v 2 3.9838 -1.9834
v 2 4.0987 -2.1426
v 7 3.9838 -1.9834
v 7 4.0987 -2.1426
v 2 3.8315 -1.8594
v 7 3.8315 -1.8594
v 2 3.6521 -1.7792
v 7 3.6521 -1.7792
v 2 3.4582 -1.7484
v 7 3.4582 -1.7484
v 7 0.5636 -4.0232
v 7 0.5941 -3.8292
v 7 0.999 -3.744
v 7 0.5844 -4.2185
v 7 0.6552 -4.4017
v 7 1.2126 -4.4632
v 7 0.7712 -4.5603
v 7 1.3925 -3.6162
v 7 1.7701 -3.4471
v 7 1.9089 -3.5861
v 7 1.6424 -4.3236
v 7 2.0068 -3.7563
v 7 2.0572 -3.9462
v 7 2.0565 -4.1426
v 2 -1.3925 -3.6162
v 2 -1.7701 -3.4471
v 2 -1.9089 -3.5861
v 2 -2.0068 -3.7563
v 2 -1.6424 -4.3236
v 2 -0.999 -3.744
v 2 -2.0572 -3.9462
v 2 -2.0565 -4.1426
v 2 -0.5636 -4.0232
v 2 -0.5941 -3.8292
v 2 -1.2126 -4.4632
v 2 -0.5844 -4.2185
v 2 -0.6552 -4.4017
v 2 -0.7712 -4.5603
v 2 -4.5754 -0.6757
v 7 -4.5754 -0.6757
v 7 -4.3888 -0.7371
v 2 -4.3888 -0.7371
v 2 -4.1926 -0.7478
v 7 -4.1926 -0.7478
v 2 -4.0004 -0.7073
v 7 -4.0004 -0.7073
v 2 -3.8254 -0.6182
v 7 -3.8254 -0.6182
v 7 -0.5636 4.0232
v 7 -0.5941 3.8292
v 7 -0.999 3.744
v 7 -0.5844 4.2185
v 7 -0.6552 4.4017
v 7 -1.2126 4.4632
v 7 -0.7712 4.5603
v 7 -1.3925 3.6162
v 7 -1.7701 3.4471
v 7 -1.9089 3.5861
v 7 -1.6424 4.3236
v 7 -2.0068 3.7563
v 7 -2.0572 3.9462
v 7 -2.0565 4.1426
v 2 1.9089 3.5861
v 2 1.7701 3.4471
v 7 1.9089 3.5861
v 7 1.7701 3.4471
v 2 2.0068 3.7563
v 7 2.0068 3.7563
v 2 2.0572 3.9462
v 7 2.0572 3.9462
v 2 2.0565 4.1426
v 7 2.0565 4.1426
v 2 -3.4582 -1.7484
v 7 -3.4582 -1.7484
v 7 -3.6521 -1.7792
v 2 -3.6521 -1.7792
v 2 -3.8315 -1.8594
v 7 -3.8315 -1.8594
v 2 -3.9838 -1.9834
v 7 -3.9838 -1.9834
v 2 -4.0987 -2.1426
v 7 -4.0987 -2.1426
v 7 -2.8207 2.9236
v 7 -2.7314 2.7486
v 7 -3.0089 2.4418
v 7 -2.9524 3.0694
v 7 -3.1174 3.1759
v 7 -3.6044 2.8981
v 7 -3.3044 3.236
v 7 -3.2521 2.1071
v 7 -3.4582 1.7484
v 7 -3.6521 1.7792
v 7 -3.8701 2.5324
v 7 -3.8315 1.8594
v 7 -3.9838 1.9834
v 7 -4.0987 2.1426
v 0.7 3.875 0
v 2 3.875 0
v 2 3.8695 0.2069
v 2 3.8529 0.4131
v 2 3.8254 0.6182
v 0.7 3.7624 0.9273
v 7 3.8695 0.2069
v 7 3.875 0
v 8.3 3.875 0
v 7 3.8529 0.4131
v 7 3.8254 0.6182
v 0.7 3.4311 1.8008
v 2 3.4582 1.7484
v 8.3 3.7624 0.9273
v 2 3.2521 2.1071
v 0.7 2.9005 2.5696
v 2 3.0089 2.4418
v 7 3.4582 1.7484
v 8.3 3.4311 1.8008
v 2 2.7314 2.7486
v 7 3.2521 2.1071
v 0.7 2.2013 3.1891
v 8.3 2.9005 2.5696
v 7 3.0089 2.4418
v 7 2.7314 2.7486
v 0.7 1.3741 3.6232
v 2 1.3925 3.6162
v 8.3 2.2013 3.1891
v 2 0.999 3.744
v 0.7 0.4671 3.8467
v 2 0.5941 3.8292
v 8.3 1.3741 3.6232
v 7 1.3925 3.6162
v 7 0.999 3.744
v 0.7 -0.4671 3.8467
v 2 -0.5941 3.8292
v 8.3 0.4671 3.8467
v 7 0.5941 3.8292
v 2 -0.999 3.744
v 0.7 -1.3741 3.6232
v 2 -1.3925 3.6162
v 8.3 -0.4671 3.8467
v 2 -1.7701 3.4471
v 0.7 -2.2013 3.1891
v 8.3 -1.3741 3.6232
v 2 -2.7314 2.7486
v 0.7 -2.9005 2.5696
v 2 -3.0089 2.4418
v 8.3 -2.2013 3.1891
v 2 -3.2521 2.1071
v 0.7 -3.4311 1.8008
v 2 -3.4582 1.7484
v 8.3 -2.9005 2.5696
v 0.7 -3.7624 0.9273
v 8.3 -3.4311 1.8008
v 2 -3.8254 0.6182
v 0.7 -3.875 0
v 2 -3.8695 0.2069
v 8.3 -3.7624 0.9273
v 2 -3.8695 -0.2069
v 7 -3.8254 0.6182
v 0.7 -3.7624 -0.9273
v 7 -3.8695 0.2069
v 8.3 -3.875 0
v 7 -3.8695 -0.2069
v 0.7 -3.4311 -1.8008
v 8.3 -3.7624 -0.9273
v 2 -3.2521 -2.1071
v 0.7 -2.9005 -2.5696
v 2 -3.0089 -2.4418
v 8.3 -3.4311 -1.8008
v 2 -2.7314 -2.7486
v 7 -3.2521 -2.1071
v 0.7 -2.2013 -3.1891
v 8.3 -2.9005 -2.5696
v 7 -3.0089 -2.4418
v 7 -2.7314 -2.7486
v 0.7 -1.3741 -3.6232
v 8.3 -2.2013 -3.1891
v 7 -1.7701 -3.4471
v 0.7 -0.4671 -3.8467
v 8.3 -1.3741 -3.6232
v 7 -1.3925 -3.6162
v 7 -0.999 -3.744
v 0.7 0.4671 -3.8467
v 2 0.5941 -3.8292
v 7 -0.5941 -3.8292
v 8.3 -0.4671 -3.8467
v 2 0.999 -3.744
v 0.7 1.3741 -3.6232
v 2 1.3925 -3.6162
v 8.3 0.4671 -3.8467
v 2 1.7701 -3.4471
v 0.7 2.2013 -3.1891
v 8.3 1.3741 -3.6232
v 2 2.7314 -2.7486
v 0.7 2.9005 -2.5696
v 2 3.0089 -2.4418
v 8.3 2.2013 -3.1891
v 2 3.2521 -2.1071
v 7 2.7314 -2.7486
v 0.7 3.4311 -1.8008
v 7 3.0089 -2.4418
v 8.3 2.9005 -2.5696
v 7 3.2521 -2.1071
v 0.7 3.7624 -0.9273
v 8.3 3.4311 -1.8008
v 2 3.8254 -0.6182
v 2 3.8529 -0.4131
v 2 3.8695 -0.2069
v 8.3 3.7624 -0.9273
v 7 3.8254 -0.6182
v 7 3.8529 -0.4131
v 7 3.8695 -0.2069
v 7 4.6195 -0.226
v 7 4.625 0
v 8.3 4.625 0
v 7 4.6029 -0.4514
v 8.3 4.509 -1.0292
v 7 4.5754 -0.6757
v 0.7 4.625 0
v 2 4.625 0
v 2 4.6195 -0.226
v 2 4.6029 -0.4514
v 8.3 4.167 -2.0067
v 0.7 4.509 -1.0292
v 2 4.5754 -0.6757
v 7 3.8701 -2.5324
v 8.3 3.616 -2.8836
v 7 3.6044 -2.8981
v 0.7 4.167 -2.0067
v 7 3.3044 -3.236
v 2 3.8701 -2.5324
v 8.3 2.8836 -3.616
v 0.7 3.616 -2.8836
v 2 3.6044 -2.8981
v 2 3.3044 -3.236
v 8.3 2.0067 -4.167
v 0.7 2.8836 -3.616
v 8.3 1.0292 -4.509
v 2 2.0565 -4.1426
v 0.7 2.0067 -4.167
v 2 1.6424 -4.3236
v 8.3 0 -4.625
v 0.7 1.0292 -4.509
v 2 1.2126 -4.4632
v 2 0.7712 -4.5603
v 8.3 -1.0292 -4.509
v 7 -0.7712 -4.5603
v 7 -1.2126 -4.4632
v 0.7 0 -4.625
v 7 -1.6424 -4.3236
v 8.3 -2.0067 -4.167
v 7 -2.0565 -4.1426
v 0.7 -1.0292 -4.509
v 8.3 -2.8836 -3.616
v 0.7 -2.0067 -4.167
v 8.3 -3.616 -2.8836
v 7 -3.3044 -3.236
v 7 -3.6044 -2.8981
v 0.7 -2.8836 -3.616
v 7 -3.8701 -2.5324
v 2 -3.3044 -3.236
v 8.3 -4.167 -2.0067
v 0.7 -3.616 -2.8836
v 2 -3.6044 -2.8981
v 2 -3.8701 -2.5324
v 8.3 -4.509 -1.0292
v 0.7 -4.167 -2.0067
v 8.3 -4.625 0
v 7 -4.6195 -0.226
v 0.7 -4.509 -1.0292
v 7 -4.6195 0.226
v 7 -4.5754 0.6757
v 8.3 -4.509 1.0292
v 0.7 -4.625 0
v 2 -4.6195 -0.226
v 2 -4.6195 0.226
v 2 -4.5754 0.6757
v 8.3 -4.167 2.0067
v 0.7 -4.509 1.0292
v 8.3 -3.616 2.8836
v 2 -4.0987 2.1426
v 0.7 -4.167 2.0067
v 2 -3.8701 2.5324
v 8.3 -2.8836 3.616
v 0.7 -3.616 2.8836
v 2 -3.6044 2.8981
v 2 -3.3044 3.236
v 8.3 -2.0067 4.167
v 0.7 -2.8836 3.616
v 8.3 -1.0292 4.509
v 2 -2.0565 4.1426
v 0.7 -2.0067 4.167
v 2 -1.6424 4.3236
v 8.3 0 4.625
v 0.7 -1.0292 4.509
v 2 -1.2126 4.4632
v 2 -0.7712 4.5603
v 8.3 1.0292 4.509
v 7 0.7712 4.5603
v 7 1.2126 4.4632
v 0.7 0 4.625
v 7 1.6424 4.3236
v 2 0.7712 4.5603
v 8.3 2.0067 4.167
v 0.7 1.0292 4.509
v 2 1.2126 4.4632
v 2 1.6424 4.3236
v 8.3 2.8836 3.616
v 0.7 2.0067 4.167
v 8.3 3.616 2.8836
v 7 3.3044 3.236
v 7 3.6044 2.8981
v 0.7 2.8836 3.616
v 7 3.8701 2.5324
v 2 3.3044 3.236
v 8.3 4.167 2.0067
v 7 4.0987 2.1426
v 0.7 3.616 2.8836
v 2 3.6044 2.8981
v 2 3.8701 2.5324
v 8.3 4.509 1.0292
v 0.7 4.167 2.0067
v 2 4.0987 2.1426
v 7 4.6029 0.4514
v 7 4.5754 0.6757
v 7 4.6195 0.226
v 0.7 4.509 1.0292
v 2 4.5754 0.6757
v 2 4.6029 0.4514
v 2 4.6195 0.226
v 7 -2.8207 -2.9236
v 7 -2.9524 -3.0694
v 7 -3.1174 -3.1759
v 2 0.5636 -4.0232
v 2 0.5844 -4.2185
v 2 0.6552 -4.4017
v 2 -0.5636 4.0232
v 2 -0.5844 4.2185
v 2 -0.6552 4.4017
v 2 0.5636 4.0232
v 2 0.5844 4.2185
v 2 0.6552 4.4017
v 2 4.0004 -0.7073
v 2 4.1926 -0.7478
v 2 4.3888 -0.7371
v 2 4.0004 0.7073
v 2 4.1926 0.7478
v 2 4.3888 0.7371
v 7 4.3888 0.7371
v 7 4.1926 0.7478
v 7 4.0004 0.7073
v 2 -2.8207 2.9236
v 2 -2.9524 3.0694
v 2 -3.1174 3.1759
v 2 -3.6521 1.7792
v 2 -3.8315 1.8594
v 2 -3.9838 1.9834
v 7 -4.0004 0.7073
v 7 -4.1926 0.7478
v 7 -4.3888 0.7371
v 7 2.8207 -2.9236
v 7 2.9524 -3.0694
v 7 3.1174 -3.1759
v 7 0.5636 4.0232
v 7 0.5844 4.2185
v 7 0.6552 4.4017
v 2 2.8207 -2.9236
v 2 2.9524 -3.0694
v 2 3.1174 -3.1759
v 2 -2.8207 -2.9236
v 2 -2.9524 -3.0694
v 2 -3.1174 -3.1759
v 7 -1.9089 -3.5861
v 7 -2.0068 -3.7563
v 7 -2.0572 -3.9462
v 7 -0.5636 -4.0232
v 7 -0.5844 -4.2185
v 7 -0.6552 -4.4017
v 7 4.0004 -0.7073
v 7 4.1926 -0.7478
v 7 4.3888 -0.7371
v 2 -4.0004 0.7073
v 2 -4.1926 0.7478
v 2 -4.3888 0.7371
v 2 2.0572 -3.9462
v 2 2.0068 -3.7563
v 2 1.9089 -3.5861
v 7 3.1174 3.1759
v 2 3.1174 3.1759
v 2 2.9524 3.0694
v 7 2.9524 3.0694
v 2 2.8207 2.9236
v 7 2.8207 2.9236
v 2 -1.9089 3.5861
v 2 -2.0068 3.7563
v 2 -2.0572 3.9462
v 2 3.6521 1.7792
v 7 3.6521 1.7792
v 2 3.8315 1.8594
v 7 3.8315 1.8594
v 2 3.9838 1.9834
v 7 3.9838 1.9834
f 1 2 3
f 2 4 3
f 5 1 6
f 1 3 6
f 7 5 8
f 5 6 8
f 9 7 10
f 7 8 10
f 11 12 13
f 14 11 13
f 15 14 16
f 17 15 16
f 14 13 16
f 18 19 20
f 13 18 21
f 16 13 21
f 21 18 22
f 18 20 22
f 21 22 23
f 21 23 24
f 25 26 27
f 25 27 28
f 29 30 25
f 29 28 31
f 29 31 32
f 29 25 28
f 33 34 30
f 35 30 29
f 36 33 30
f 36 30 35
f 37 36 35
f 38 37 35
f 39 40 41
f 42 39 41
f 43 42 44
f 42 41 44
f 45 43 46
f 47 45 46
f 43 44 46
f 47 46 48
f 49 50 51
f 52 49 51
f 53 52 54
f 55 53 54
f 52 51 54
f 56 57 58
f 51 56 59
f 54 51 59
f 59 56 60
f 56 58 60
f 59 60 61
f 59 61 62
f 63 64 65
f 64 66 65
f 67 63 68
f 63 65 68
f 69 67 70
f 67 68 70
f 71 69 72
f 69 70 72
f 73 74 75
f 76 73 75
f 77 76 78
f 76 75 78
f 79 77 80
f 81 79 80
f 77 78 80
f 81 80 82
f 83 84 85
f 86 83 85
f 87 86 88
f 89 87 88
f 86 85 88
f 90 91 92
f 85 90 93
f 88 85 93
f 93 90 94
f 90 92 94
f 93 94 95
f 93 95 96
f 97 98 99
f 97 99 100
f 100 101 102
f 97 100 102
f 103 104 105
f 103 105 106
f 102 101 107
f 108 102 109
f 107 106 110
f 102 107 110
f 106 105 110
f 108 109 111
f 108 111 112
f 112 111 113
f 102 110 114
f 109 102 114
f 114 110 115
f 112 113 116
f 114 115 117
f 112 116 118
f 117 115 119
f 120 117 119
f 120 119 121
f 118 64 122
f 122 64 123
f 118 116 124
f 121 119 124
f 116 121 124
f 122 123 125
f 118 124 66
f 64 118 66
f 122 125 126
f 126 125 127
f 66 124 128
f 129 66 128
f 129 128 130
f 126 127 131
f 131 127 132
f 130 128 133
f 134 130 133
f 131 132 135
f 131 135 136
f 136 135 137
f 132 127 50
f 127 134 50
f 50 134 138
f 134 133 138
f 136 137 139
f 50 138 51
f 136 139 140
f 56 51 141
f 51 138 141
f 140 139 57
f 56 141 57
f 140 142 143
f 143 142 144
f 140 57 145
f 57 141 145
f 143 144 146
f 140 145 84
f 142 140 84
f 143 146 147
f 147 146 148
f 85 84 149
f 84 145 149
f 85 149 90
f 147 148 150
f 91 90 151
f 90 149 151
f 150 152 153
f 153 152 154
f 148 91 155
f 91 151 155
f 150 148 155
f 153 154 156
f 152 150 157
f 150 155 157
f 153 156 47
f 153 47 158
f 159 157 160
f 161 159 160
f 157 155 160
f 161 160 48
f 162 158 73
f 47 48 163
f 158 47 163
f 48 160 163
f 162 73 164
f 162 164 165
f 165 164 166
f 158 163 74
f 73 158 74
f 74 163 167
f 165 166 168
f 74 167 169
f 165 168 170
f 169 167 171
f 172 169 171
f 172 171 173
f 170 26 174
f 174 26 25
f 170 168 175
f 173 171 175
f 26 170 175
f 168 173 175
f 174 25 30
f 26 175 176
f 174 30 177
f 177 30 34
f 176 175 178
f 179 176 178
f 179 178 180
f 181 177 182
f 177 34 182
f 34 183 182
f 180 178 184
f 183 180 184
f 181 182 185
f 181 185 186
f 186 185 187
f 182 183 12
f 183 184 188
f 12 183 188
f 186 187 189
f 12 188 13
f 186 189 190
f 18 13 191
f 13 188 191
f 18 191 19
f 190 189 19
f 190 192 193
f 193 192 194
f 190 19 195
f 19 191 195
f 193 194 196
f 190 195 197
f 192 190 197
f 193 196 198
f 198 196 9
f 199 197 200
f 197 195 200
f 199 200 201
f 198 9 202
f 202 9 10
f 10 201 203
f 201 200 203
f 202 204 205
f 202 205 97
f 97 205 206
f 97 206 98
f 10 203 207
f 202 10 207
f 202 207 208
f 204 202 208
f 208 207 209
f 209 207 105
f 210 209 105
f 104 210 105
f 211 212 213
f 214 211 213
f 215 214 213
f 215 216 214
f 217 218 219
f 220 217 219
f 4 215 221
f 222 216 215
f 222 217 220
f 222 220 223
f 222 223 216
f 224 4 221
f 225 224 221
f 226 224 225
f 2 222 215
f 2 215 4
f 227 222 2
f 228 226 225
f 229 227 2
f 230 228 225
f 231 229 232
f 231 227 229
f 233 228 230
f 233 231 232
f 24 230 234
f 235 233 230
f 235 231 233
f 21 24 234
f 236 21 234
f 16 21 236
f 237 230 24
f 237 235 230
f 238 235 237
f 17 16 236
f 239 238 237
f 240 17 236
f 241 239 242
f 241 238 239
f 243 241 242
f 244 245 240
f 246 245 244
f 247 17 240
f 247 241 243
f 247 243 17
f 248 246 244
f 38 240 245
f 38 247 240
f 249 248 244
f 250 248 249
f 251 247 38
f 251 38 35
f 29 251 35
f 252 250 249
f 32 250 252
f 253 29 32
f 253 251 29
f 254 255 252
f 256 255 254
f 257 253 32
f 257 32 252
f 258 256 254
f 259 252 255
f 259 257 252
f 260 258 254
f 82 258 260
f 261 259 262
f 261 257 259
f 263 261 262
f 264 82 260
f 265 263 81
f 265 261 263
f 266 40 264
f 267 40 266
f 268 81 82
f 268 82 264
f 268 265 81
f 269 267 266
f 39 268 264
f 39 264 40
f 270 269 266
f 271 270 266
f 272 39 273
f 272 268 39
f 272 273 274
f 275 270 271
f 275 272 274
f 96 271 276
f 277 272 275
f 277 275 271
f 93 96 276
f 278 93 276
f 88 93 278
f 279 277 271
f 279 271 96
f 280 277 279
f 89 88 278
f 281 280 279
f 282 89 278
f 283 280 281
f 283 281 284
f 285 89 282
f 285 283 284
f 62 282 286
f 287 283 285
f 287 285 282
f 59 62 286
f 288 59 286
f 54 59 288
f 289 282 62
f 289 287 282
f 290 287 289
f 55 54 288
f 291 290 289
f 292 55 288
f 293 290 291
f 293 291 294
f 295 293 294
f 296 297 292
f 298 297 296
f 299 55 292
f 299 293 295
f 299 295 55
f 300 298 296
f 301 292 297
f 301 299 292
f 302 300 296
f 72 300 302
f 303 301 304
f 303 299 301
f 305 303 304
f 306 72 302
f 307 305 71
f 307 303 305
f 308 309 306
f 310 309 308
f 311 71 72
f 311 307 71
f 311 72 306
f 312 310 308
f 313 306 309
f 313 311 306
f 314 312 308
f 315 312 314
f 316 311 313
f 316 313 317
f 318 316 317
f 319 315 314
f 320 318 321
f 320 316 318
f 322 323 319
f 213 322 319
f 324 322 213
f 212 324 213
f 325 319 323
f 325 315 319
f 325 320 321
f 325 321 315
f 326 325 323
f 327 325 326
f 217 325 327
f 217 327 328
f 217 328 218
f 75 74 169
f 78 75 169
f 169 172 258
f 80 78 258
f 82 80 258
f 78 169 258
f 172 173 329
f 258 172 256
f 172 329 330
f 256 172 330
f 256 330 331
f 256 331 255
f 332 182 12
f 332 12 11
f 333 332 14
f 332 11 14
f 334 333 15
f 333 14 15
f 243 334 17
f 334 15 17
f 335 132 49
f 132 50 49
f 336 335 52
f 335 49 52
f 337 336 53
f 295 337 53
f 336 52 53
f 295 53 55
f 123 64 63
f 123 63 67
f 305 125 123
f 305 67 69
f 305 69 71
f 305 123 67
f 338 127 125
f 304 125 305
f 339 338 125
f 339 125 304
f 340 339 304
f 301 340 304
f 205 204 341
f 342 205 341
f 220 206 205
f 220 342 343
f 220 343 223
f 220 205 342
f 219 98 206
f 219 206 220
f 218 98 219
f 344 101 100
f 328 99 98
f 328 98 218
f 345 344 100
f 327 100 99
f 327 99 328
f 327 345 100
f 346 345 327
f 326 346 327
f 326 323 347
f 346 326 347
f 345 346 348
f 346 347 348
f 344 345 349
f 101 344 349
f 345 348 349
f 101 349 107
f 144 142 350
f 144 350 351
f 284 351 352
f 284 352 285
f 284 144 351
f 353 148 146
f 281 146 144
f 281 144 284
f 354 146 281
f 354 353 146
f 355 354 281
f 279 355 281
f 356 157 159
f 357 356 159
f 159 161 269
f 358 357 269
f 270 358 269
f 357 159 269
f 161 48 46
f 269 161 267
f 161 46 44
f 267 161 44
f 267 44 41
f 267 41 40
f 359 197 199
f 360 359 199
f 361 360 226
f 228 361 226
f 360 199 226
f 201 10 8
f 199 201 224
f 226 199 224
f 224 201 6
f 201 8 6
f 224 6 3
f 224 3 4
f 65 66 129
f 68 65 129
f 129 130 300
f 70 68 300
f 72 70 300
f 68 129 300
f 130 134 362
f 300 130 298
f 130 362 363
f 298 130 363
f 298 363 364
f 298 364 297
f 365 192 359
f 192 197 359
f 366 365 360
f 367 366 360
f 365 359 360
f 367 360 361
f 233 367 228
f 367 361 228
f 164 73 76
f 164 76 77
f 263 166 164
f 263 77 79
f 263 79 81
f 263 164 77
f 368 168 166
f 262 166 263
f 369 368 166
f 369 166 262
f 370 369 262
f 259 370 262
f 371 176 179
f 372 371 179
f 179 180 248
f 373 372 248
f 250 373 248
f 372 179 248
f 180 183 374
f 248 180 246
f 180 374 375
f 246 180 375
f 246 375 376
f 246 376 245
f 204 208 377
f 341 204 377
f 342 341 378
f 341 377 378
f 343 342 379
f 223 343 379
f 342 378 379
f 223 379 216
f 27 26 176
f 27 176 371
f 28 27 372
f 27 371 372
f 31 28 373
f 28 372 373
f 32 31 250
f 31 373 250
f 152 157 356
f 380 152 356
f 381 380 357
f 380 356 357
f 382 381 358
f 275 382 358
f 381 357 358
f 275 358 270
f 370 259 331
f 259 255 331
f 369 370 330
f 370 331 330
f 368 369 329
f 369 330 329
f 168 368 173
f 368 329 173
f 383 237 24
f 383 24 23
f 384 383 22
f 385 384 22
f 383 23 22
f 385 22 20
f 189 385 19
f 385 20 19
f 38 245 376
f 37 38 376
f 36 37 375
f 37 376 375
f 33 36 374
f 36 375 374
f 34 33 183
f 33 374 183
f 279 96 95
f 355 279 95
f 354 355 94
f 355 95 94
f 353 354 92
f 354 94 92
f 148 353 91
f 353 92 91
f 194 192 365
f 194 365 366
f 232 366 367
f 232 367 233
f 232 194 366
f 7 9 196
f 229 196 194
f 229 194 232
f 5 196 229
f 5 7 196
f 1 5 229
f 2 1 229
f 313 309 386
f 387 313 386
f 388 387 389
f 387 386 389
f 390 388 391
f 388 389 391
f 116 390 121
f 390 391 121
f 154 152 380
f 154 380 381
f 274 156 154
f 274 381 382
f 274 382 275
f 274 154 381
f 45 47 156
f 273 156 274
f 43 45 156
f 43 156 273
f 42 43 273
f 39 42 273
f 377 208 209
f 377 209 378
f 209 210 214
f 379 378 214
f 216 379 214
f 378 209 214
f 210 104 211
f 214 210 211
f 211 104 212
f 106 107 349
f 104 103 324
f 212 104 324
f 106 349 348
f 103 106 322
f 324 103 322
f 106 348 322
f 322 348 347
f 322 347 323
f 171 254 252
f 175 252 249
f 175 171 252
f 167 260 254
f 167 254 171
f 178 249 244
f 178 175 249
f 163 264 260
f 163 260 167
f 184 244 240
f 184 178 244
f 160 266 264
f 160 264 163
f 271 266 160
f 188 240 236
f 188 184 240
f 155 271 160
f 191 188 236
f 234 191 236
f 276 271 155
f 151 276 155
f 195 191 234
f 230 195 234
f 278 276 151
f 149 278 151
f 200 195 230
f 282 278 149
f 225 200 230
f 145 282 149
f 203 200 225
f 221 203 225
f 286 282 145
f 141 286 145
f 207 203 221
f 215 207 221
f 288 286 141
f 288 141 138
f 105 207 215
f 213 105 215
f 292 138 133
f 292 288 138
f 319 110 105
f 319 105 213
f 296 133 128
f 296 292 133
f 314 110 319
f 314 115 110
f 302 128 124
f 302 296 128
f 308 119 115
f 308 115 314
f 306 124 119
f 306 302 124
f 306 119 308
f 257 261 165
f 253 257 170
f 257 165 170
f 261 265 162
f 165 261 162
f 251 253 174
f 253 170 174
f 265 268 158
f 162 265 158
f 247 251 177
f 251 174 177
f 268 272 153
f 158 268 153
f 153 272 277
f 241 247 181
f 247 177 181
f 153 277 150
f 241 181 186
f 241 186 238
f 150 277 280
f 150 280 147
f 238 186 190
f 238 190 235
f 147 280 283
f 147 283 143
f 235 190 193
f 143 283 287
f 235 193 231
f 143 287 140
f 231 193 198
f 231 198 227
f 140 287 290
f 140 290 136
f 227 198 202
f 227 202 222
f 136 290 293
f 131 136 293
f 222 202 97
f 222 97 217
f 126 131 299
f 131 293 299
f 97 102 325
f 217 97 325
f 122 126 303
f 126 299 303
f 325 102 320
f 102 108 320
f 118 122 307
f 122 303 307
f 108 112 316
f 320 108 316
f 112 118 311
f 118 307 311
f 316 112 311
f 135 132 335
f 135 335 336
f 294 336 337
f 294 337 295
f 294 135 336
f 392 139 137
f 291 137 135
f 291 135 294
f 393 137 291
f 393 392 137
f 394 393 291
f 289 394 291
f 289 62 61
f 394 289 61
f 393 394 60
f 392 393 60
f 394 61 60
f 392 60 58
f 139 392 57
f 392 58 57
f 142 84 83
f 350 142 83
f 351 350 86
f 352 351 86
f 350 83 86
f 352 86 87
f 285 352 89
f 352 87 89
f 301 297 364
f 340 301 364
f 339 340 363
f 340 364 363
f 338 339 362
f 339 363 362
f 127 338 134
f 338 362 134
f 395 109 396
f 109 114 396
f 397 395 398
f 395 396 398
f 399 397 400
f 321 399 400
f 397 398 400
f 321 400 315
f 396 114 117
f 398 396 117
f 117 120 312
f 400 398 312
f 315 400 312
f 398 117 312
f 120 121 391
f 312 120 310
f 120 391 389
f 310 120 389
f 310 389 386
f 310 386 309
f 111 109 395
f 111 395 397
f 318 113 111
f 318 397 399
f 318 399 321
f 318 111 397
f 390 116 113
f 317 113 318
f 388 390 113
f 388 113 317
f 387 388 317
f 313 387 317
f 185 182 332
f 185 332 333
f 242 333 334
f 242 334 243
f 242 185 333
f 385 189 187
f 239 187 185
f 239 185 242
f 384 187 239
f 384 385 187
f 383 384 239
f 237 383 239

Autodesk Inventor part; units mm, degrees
sketch "Sketch_1" plane through (0, 0, 0) normal (0, 0, 1) x (1, 0, 0)
  line L0 (8.3, 0) -> (0.7, 0)
  line L1 (0.7, 3.875) -> (8.3, 3.875)
  line L2 (8.3, 3.875) -> (8.3, 4.625)
  line L3 (8.3, 4.625) -> (0.7, 4.625)
  line L4 (0.7, 4.625) -> (0.7, 3.875)
revolve "Revolution1" add sketch "Sketch_1" angle 360 about axis through (8.3, 0, 0) along (1, 0, 0)
sketch "Sketch_2" plane through (0, 0, 0) normal (0, 0, 1) x (1, 0, 0)
  line L0 (7, 4.25) -> (2, 4.25)
  line L1 (2, 4.25) -> (2, 5)
  line L2 (2, 5) -> (7, 5)
  line L3 (7, 5) -> (7, 4.25)
  line L4 (7, 4.25) -> (2, 4.25)
revolve "Revolution2" cut sketch "Sketch_2" angle 360 about axis through (7, 4.25, 0) along (1, 0, 0)
pattern_circular "Circular Pattern1" count 10 over 360 about axis through (4.5, 0, 0) along (1, 0, 0) of "Revolution2"
ref_plane "IP_1_XY" through (4.5, 0, 0) normal (1, 0, 0) x (0, 0, -1)
ref_plane "IP_1_YZ" through (4.5, 0, 0) normal (0, 0, -1) x (0, 1, 0)
ref_plane "IP_1_ZX" through (4.5, 0, 0) normal (0, 1, 0) x (1, 0, 0)
ref_plane "IP_3_1_XY" through (4.5, 4.25, 0) normal (1, 0, 0) x (0, 0, -1)
ref_plane "IP_3_1_YZ" through (4.5, 4.25, 0) normal (0, 0, -1) x (0, 1, 0)
ref_plane "IP_3_1_ZX" through (4.5, 4.25, 0) normal (0, 1, 0) x (1, 0, 0)
ref_plane "IP_3_10_XY" through (4.5, 3.4383, -2.4981) normal (1, 0, 0) x (0, 0, -1)
ref_plane "IP_3_10_YZ" through (4.5, 3.4383, -2.4981) normal (0, 0, -1) x (0, 1, 0)
ref_plane "IP_3_10_ZX" through (4.5, 3.4383, -2.4981) normal (0, 1, 0) x (1, 0, 0)
ref_plane "IP_3_2_XY" through (4.5, 3.4383, 2.4981) normal (1, 0, 0) x (0, 0, -1)
ref_plane "IP_3_2_YZ" through (4.5, 3.4383, 2.4981) normal (0, 0, -1) x (0, 1, 0)
ref_plane "IP_3_2_ZX" through (4.5, 3.4383, 2.4981) normal (0, 1, 0) x (1, 0, 0)
ref_plane "IP_3_3_XY" through (4.5, 1.3133, 4.042) normal (1, 0, 0) x (0, 0, -1)
ref_plane "IP_3_3_YZ" through (4.5, 1.3133, 4.042) normal (0, 0, -1) x (0, 1, 0)
ref_plane "IP_3_3_ZX" through (4.5, 1.3133, 4.042) normal (0, 1, 0) x (1, 0, 0)
ref_plane "IP_3_4_XY" through (4.5, -1.3133, 4.042) normal (1, 0, 0) x (0, 0, -1)
ref_plane "IP_3_4_YZ" through (4.5, -1.3133, 4.042) normal (0, 0, -1) x (0, 1, 0)
ref_plane "IP_3_4_ZX" through (4.5, -1.3133, 4.042) normal (0, 1, 0) x (1, 0, 0)
ref_plane "IP_3_5_XY" through (4.5, -3.4383, 2.4981) normal (1, 0, 0) x (0, 0, -1)
ref_plane "IP_3_5_YZ" through (4.5, -3.4383, 2.4981) normal (0, 0, -1) x (0, 1, 0)
ref_plane "IP_3_5_ZX" through (4.5, -3.4383, 2.4981) normal (0, 1, 0) x (1, 0, 0)
ref_plane "IP_3_6_XY" through (4.5, -4.25, 0) normal (1, 0, 0) x (0, 0, -1)
ref_plane "IP_3_6_YZ" through (4.5, -4.25, 0) normal (0, 0, -1) x (0, 1, 0)
ref_plane "IP_3_6_ZX" through (4.5, -4.25, 0) normal (0, 1, 0) x (1, 0, 0)
ref_plane "IP_3_7_XY" through (4.5, -3.4383, -2.4981) normal (1, 0, 0) x (0, 0, -1)
ref_plane "IP_3_7_YZ" through (4.5, -3.4383, -2.4981) normal (0, 0, -1) x (0, 1, 0)
ref_plane "IP_3_7_ZX" through (4.5, -3.4383, -2.4981) normal (0, 1, 0) x (1, 0, 0)
ref_plane "IP_3_8_XY" through (4.5, -1.3133, -4.042) normal (1, 0, 0) x (0, 0, -1)
ref_plane "IP_3_8_YZ" through (4.5, -1.3133, -4.042) normal (0, 0, -1) x (0, 1, 0)
ref_plane "IP_3_8_ZX" through (4.5, -1.3133, -4.042) normal (0, 1, 0) x (1, 0, 0)
ref_plane "IP_3_9_XY" through (4.5, 1.3133, -4.042) normal (1, 0, 0) x (0, 0, -1)
ref_plane "IP_3_9_YZ" through (4.5, 1.3133, -4.042) normal (0, 0, -1) x (0, 1, 0)
ref_plane "IP_3_9_ZX" through (4.5, 1.3133, -4.042) normal (0, 1, 0) x (1, 0, 0)
properties part number "HK0709FMCA" material "Steel"
